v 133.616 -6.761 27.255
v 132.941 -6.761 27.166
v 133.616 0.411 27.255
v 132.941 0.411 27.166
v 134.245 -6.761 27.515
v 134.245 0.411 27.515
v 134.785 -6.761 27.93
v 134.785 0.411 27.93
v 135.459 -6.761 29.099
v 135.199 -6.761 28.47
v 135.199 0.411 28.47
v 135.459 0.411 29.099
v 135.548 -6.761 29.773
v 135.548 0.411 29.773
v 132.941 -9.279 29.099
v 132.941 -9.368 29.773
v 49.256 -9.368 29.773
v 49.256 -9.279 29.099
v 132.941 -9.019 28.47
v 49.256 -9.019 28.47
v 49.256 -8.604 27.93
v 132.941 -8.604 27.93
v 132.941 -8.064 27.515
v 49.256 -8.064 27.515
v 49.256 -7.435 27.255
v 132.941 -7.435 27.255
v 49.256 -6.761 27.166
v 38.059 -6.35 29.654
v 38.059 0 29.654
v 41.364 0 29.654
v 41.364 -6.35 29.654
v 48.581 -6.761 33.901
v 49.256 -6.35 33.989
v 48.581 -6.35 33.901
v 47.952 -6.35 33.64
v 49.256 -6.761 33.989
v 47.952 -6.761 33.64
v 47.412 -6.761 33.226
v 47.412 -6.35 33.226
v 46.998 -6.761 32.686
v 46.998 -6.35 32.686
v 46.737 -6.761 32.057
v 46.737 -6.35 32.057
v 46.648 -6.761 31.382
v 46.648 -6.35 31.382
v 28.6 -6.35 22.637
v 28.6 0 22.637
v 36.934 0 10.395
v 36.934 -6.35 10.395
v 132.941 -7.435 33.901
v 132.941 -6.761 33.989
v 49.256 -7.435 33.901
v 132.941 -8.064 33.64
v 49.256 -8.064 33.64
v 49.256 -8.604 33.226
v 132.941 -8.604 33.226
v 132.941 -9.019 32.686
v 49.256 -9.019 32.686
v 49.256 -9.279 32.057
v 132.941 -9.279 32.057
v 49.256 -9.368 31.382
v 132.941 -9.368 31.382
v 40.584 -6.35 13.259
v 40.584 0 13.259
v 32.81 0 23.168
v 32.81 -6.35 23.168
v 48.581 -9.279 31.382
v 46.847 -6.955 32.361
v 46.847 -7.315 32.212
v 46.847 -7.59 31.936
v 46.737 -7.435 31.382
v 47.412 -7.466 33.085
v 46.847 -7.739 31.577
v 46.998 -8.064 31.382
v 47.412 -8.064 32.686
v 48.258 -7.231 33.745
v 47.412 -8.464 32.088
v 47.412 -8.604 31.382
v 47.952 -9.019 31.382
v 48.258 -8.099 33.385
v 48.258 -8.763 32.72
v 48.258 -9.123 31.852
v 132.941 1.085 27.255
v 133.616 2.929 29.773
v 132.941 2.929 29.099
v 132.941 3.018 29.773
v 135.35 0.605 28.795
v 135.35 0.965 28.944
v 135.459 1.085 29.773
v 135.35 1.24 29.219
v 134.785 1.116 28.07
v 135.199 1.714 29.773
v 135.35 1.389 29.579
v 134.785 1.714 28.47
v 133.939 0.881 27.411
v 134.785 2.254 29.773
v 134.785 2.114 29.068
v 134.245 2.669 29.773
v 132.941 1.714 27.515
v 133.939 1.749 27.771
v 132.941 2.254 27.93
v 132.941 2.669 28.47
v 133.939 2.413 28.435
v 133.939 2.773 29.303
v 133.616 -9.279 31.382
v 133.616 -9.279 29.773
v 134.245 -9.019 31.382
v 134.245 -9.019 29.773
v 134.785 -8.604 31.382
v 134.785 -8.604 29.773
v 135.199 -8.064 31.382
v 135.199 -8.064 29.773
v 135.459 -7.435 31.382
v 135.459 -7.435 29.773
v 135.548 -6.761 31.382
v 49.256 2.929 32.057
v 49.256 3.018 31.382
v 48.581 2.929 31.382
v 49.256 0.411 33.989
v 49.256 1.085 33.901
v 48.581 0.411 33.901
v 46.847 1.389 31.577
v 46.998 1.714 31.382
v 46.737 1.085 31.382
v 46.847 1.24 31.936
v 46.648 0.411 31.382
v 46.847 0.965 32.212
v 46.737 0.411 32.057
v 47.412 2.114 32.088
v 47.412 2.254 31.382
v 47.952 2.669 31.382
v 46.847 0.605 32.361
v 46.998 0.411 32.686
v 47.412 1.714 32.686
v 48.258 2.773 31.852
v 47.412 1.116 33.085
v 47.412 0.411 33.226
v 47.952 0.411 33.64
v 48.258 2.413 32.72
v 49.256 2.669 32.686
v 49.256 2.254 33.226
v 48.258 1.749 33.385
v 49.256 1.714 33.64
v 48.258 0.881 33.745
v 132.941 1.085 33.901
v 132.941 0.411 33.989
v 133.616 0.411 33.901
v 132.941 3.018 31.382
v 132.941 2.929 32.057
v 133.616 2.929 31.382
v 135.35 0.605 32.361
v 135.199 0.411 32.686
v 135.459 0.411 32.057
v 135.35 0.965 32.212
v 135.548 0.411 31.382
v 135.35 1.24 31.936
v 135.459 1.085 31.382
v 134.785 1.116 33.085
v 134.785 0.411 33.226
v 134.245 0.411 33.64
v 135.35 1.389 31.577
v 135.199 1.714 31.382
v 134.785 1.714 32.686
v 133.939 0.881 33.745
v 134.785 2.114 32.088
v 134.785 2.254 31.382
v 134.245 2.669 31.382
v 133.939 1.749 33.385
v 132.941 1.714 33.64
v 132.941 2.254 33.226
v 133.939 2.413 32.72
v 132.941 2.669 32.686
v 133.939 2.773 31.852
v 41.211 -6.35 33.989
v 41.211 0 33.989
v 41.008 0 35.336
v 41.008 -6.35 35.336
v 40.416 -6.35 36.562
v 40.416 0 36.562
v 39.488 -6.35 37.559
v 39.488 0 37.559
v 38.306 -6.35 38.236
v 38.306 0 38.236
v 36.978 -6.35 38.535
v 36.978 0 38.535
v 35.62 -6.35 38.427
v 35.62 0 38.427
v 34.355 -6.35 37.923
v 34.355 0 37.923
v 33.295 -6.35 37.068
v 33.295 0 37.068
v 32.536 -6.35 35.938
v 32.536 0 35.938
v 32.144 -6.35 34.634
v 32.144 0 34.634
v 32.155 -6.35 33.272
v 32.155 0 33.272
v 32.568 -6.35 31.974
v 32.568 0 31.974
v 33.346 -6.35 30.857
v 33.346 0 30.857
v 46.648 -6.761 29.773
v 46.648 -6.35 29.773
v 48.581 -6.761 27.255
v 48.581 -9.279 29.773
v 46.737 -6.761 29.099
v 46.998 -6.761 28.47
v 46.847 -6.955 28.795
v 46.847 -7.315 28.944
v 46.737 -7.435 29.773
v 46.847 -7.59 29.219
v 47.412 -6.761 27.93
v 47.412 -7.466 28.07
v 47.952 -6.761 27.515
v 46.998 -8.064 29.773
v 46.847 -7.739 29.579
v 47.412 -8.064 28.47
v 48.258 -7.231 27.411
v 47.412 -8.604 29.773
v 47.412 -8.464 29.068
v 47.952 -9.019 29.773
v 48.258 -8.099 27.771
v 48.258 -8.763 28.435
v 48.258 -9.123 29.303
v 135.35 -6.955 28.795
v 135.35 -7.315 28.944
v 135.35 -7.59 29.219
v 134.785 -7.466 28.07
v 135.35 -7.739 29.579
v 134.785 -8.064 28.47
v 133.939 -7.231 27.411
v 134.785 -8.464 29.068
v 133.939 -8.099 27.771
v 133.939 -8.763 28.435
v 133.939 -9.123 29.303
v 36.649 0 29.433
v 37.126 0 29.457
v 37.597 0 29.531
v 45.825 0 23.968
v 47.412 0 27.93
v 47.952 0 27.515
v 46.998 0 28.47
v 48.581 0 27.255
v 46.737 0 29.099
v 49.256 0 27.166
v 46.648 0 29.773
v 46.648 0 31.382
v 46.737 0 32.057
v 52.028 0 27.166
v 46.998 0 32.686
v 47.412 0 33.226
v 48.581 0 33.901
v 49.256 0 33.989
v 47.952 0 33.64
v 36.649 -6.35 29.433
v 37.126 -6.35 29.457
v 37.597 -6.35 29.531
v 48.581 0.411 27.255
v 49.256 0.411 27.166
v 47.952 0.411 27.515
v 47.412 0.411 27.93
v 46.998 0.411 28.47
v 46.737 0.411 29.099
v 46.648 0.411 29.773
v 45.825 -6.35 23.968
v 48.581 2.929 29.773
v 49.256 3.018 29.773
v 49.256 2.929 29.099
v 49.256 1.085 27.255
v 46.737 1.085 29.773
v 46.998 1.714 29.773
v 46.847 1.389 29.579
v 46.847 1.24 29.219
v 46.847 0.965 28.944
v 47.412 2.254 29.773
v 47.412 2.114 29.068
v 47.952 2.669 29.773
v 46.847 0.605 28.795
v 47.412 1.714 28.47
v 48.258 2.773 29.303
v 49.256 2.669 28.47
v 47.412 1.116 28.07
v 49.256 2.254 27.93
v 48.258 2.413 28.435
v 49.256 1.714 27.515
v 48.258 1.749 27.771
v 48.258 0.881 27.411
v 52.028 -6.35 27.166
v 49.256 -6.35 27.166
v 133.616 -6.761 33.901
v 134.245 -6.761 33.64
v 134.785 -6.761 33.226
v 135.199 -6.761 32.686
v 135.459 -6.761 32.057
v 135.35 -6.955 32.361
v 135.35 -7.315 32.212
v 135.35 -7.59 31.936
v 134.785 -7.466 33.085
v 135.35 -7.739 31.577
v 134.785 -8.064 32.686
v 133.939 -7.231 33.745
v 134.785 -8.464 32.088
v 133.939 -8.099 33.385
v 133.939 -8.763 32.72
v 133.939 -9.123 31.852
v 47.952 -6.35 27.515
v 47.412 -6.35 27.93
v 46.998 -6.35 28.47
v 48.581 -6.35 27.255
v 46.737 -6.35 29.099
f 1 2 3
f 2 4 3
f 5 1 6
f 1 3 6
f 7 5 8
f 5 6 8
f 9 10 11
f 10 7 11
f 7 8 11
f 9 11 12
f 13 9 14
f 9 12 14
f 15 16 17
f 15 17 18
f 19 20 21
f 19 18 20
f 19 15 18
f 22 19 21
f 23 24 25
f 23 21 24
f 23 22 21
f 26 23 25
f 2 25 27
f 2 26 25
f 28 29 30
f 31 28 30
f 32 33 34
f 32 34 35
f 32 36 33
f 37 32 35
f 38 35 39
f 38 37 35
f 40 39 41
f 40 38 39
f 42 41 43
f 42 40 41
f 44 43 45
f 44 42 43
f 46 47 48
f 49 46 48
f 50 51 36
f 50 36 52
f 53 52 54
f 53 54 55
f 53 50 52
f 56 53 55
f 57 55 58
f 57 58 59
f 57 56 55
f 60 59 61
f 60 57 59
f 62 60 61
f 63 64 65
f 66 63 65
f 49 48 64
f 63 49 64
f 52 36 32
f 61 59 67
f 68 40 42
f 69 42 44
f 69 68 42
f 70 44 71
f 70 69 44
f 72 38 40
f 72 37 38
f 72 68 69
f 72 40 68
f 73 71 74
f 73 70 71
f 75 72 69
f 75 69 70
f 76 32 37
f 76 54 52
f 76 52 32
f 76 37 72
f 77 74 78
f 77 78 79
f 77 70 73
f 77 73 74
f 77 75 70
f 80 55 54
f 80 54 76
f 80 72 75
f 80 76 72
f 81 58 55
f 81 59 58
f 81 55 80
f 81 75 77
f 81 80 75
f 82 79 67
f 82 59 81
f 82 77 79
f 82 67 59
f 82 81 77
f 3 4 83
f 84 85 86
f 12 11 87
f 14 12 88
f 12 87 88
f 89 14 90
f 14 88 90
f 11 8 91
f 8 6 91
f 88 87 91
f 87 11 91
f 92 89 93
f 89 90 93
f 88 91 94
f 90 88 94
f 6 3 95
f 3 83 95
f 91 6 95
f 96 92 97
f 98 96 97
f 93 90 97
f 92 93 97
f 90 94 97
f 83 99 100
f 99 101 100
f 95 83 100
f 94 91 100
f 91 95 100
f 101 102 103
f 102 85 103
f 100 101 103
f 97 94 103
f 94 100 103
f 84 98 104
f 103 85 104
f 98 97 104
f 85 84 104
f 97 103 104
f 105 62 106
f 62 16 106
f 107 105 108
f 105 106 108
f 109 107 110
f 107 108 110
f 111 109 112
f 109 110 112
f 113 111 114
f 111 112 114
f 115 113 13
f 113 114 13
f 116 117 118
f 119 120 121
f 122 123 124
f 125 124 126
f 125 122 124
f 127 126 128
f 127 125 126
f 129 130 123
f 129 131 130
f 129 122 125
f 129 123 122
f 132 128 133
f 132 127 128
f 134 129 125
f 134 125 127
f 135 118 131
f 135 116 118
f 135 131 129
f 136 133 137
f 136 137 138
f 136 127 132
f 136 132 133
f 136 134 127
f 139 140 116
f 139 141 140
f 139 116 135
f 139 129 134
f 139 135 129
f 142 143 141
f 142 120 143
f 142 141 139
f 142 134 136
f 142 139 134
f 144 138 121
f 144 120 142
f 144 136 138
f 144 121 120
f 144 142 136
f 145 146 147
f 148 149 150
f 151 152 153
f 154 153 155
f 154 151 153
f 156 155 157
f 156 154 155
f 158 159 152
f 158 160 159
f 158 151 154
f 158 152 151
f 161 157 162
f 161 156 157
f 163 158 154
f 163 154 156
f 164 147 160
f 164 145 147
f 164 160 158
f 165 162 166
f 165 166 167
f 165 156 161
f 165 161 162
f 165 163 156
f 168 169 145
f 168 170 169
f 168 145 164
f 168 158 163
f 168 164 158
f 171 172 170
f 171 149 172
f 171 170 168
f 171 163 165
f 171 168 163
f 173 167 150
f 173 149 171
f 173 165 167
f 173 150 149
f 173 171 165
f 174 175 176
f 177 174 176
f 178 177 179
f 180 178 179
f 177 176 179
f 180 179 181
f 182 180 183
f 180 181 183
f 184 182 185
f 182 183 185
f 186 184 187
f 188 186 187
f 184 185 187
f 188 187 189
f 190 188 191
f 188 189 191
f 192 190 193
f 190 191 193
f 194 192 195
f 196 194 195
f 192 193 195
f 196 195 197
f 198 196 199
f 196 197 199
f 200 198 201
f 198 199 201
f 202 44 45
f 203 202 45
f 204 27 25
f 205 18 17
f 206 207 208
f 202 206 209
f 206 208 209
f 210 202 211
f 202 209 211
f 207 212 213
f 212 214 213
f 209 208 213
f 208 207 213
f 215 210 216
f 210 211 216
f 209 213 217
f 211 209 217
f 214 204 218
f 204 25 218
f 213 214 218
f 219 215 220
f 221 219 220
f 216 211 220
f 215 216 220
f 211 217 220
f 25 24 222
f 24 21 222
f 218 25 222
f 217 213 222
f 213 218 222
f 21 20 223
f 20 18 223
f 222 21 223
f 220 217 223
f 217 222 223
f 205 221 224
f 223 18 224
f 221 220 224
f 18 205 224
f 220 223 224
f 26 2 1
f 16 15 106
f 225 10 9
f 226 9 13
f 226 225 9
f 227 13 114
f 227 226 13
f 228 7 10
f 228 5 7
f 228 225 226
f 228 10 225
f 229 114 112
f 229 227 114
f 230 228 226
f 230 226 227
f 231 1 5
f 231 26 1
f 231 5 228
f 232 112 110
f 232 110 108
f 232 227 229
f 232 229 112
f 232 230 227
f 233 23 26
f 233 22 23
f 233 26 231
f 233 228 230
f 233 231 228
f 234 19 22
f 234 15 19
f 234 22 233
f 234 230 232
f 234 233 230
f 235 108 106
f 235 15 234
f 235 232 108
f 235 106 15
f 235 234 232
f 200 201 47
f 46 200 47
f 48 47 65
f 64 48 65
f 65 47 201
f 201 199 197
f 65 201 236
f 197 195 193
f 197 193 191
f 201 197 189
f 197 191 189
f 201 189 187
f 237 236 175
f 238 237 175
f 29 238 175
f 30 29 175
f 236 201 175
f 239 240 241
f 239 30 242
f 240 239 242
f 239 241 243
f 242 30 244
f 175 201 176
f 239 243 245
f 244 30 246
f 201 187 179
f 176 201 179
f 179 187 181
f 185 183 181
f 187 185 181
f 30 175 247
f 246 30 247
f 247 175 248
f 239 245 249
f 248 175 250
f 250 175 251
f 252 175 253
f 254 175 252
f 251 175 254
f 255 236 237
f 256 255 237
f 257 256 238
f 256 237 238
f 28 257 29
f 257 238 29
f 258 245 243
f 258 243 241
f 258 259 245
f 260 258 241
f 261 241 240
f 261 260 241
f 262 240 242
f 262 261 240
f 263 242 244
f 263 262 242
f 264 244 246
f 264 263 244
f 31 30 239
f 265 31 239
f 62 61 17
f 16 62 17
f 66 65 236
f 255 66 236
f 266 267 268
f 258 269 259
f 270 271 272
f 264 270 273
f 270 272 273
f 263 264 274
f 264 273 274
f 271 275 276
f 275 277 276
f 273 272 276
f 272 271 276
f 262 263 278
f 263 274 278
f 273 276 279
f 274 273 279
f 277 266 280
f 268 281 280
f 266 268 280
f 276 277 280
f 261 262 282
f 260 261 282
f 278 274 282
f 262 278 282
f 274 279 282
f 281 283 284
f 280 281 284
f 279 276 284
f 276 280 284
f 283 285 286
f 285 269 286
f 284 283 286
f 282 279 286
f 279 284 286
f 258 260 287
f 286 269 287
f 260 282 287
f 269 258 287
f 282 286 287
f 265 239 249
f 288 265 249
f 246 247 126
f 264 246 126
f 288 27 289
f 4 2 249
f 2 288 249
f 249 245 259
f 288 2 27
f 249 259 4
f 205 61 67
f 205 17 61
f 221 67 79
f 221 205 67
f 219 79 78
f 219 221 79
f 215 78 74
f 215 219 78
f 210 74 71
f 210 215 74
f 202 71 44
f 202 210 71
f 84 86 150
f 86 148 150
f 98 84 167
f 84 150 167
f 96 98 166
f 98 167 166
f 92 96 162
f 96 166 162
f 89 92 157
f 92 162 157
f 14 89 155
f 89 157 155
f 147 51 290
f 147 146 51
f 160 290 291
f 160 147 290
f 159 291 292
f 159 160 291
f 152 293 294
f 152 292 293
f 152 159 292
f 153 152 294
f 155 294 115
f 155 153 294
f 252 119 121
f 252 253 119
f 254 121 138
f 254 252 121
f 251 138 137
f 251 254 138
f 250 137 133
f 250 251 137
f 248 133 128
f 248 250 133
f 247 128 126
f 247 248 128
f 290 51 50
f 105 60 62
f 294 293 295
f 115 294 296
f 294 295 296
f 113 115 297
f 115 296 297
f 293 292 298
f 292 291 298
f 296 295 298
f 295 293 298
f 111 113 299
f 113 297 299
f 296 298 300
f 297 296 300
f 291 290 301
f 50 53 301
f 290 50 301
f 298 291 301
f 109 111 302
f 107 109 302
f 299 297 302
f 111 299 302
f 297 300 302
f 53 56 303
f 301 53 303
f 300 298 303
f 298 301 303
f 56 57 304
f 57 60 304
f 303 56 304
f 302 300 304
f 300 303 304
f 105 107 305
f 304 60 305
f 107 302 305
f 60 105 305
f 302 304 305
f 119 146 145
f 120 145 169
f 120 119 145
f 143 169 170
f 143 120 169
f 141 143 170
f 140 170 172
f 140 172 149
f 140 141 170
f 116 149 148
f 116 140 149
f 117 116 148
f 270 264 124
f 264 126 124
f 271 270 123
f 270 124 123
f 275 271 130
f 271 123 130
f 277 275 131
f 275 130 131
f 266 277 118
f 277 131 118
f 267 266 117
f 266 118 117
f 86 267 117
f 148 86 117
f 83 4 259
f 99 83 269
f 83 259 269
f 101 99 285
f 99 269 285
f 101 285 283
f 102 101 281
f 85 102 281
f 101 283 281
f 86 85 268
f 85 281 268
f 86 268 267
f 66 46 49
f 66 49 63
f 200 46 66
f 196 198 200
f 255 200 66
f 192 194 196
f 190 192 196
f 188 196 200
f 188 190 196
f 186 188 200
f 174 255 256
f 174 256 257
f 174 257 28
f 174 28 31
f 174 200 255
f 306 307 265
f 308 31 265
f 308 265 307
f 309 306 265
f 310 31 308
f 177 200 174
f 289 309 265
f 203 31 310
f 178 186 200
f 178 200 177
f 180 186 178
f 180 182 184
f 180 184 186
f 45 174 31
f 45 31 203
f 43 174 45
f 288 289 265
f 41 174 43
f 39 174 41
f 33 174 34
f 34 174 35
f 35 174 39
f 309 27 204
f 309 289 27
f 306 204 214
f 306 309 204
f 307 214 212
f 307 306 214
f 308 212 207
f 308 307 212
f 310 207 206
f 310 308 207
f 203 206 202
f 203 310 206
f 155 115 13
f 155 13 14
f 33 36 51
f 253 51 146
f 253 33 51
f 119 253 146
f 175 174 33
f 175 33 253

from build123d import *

# Parameters (mm, degrees)
F1_DEPTH = 6.35
F2_W     = 6.35
F2_H     = 4.3350251792
F3_DEPTH = 25.4
F4_DEPTH = 63.5
F5_R     = 2.607278221


# Not quite as in the source:
# - a feature names something its author has since deleted; it is built from what else it names


with BuildPart() as f1:
    # F0 (on Front) → F1 (new body)
    with BuildSketch(Plane.XZ):
        with BuildLine():
            ThreePointArc((38.0586988364, 29.6543792382), (40.3399245407, 31.3092753383), (41.2114633723, 33.9894044175))
            ThreePointArc((41.2114633723, 33.9894044175), (34.9686895654, 38.2226770455), (33.345850058, 30.8565916617))
            ThreePointArc((33.345850058, 30.8565916617), (34.8508967595, 29.8049682674), (36.6488133888, 29.4327141456))
            ThreePointArc((36.6488133888, 29.4327141456), (37.3624884645, 29.4880051728), (38.0586988364, 29.6543792382))
        make_face()
        with BuildLine():
            ThreePointArc((36.6488133888, 29.4327141456), (34.8508967595, 29.8049682674), (33.345850058, 30.8565916617))
            Line((33.345850058, 30.8565916617), (28.5997511098, 22.6370067444))
            Line((28.5997511098, 22.6370067444), (36.9340473419, 10.395447725))
            Line((36.9340473419, 10.395447725), (40.5838886152, 13.2587963652))
            Line((40.5838886152, 13.2587963652), (32.8096505039, 23.1684296974))
            Line((32.8096505039, 23.1684296974), (36.6488133888, 29.4327141456))
        make_face()
        Polygon((56.8539685432, 29.6543792382), (41.3639992476, 29.6543792382), (45.8250723122, 23.9679572756), align=None)
        with BuildLine():
            Line((72.0483290742, 33.9894044175), (41.2114633723, 33.9894044175))
            ThreePointArc((41.2114633723, 33.9894044175), (40.3399245407, 31.3092753383), (38.0586988364, 29.6543792382))
            Line((38.0586988364, 29.6543792382), (41.3639992476, 29.6543792382))
            Line((41.3639992476, 29.6543792382), (56.8539685432, 29.6543792382))
            Line((56.8539685432, 29.6543792382), (72.0483290742, 29.6543792382))
            Line((72.0483290742, 29.6543792382), (72.0483290742, 33.9894044175))
        make_face()
    extrude(amount=F1_DEPTH)

    # F2 (on face) → F3 (join)
    with BuildSketch(Plane.YZ.offset(72.0483290742)):
        Polygon((-6.35, 29.6543792382), (-6.35, 33.9894044175), (-9.3679074198, 33.9894044175), (-9.3679074198, 27.1660927683), (3.0179074198, 27.1660927683), (3.0179074198, 33.9894044175), (0, 33.9894044175), (0, 29.6543792382), align=None)
        with Locations((-3.175, 31.8218918279)):
            Rectangle(F2_W, F2_H)
    extrude(amount=-F3_DEPTH)

    # F4 (add): a face of the model
    f4_faces = [f1.faces().sort_by_distance(p)[0] for p in [
        (72.0483290742, -3.175, 30.5777485929),
    ]]
    extrude(f4_faces, amount=F4_DEPTH)

    # F5
    f5_edges = [f1.edges().sort_by_distance(p)[0] for p in [
        (91.098329, 3.017907, 33.989404),
        (91.098329, 3.017907, 27.166093),
        (91.098329, -9.367907, 27.166093),
        (91.098329, -9.367907, 33.989404),
        (135.548329, -3.175, 33.989404),
        (135.548329, -3.175, 27.166093),
        (135.548329, -9.367907, 30.577749),
        (135.548329, 3.017907, 30.577749),
        (46.648329, 3.017907, 30.577749),
        (46.648329, 1.508954, 33.989404),
        (46.648329, 1.508954, 27.166093),
        (46.648329, -7.858954, 33.989404),
        (46.648329, -7.858954, 27.166093),
        (46.648329, -9.367907, 30.577749),
    ]]
    fillet(f5_edges, radius=F5_R)


solid = f1.part
